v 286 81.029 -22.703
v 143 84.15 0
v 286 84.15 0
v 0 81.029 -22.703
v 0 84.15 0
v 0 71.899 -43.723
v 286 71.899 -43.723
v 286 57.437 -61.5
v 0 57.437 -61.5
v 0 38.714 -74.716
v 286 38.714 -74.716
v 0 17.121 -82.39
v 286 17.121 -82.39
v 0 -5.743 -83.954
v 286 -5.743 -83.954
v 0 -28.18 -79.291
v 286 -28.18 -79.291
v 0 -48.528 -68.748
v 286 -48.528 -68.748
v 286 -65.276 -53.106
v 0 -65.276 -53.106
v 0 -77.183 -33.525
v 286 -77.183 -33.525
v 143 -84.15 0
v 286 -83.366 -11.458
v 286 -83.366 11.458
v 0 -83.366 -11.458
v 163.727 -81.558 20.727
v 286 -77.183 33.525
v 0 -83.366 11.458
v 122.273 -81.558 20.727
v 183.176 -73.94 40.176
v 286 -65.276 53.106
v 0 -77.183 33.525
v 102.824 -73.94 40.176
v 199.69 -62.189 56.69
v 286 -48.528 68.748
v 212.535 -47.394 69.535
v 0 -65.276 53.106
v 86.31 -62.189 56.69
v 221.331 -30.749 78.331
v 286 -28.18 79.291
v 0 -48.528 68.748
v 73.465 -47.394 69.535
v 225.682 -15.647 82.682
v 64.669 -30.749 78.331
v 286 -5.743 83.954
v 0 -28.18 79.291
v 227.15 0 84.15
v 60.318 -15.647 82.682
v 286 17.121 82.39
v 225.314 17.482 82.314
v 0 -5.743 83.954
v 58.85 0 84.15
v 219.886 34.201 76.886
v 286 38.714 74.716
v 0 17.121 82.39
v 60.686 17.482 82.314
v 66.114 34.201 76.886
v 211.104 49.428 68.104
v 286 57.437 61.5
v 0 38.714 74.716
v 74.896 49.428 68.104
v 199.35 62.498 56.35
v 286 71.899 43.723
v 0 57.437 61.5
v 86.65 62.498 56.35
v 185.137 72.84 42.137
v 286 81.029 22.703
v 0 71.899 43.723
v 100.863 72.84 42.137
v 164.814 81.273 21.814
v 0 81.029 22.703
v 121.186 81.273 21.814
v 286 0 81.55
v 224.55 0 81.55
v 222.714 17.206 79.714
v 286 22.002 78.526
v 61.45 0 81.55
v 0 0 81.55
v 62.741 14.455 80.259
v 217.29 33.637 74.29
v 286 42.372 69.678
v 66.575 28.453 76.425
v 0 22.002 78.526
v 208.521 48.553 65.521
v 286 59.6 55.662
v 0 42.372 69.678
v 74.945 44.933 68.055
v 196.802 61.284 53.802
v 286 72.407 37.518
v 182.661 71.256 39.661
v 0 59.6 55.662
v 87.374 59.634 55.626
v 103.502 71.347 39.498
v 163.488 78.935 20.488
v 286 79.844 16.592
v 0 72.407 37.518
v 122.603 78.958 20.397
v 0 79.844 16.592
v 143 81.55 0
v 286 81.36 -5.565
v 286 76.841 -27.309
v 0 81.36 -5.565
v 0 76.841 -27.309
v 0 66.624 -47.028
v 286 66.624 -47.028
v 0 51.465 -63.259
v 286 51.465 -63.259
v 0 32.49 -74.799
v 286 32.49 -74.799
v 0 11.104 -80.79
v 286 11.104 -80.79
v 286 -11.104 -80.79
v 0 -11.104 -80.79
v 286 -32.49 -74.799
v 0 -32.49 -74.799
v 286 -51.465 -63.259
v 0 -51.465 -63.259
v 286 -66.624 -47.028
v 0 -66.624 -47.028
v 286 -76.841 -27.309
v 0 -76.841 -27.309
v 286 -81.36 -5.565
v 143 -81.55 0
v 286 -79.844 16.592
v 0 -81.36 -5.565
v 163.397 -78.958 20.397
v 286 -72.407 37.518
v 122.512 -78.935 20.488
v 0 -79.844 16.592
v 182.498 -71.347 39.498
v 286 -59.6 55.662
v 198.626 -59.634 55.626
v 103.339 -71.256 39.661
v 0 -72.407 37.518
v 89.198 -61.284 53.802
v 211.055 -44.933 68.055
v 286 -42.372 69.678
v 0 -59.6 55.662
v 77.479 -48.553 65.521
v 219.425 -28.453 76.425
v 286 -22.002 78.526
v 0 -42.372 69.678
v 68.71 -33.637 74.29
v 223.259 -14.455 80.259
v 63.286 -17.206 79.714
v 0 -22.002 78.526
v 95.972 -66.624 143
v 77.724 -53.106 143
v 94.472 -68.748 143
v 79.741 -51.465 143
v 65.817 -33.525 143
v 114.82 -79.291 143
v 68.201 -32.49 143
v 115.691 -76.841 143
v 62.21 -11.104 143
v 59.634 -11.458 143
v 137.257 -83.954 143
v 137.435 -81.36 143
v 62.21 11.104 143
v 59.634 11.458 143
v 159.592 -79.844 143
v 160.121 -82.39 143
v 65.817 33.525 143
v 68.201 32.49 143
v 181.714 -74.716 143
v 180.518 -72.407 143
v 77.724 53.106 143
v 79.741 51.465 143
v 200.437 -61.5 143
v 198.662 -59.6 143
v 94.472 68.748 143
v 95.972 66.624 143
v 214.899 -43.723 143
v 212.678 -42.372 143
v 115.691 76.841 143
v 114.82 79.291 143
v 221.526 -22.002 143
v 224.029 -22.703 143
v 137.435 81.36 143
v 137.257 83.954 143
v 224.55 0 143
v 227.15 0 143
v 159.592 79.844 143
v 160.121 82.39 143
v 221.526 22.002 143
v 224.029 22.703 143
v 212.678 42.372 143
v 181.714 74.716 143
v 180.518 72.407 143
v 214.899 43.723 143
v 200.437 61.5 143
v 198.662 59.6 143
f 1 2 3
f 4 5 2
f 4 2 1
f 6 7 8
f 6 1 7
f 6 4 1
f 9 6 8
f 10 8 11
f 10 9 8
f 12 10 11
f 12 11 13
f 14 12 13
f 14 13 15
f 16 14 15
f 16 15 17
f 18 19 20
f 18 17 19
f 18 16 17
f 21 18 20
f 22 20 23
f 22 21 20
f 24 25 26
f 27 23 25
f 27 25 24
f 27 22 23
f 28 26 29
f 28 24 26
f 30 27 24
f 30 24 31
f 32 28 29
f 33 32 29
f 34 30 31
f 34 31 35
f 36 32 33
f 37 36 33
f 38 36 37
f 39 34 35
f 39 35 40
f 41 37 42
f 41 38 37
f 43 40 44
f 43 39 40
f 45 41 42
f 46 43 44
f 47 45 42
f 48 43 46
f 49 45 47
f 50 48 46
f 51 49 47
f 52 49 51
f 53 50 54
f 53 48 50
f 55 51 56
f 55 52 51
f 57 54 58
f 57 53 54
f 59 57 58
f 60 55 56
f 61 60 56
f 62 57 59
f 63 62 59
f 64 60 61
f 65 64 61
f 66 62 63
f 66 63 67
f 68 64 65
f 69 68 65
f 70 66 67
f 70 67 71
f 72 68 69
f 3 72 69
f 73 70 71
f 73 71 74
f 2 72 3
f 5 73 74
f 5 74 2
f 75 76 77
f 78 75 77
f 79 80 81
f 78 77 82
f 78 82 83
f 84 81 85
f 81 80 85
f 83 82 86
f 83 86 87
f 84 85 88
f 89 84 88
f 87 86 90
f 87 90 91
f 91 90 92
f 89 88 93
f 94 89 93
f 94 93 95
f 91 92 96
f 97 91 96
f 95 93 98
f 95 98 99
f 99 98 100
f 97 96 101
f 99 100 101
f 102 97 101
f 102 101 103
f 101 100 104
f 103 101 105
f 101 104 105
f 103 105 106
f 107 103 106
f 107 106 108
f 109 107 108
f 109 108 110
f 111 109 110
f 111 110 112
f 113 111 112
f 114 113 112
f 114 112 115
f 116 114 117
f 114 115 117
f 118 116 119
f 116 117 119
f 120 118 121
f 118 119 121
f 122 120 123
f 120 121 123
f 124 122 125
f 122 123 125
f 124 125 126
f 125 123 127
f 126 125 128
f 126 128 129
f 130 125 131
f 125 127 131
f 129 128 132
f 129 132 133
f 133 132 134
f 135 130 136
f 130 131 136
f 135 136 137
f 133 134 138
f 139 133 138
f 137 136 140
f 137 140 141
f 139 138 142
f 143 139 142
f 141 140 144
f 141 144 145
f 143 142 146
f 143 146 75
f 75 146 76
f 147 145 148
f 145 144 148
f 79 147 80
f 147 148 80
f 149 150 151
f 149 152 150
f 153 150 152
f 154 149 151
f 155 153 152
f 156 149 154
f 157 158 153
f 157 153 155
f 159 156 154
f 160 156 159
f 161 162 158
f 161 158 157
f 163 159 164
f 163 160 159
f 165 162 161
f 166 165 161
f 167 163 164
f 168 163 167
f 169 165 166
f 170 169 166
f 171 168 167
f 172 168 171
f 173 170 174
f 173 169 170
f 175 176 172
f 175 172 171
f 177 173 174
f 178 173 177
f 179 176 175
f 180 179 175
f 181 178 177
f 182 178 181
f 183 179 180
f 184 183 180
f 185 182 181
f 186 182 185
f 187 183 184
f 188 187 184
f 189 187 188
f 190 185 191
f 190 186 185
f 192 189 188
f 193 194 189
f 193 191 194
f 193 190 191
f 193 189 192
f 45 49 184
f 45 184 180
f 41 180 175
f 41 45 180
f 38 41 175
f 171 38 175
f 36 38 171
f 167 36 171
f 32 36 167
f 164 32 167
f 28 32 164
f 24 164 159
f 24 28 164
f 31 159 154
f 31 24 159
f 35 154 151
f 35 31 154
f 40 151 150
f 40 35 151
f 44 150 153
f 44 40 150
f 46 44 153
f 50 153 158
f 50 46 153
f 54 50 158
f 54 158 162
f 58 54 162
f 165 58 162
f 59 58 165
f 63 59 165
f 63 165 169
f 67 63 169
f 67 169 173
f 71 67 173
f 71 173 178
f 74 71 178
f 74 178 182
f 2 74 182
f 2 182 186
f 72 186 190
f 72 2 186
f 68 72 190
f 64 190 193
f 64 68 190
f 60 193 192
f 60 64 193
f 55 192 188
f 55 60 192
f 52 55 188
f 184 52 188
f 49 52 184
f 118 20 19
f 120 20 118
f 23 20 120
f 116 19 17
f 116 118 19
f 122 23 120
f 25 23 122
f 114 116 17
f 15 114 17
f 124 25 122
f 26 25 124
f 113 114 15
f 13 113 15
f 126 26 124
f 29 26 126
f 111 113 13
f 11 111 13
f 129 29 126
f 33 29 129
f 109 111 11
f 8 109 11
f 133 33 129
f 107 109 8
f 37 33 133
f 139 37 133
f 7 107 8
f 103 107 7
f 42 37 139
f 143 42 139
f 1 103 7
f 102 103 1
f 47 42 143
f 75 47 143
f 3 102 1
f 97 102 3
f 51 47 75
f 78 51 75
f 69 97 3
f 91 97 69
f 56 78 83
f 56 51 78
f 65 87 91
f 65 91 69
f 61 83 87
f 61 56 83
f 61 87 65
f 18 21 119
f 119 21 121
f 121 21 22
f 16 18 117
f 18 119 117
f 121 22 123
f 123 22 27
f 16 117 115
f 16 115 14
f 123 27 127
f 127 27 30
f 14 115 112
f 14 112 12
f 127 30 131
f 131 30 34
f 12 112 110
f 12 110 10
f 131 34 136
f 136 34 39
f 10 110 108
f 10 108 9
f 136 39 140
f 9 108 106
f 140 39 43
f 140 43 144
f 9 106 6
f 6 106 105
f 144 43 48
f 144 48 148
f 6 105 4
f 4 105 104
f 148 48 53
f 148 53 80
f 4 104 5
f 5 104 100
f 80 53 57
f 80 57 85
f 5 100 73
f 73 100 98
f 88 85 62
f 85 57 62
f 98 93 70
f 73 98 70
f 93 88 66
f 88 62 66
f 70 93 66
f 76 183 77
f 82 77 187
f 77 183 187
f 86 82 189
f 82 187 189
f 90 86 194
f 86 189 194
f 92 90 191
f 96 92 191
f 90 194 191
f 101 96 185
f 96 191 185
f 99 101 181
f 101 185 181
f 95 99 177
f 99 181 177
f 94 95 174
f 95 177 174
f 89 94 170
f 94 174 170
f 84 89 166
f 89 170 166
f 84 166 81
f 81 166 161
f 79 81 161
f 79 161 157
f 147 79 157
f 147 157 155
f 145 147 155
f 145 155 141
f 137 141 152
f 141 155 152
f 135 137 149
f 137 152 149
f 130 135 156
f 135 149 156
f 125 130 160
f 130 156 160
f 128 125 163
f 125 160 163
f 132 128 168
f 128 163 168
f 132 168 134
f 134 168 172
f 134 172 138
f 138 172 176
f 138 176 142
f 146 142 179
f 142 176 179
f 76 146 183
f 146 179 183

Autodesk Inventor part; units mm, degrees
ref_plane "YZ Plane" through (0, 0, 0) normal (1, 0, 0) x (0, 1, 0)
ref_plane "XZ Plane" through (0, 0, 0) normal (0, 1, 0) x (-1, 0, 0)
ref_plane "XY Plane" through (0, 0, 0) normal (0, 0, 1) x (1, 0, 0)
sketch "Sketch1" plane through (0, 0, 0) normal (1, 0, 0) x (0, 1, 0)
  circle A0 centre (0, 0) radius 84.15
  dimension "d0" = 168.3
extrude "Extrude1" add sketch "Sketch1" along normal blind 286
sketch "Sketch2" plane through (0, 0, 0) normal (0, 0, 1) x (1, 0, 0)
  line L0 (0, 84.15) -> (0, -84.15) projected
  line L1 (286, 84.15) -> (286, -84.15) projected
  line L2 (0, 0) -> (286, 0) construction
  circle A0 centre (143, 0) radius 84.15
  dimension "d3" = 168.3
extrude "Extrude2" add sketch "Sketch2" along normal blind 143
sketch "Sketch3" plane through (0, 0, 0) normal (-1, 0, 0) x (0, 0, 1)
  circle A0 centre (0, 0) radius 84.15 projected
  circle A1 centre (0, 0) radius 81.55
  dimension "d6" = 163.1
extrude "Extrude3" cut sketch "Sketch3" against normal through all contours A1
sketch "Sketch4" plane through (143, 0, 143) normal (0, 0, 1) x (1, 0, 0)
  circle A0 centre (0, 0) radius 84.15 projected
  circle A1 centre (0, 0) radius 81.55
  dimension "d9" = 163.1
extrude "Extrude4" cut sketch "Sketch4" against normal up to next contours A1
equation "\"d0\" = d"
equation "\"d1\" = 2 * a"
equation "\"d3\" = d"
equation "\"d4\" = a"
equation "\"d6\" = d - 2 * s1"
equation "\"d7\" = a"
equation "\"d9\" = d - 2 * s1"
equation "\"d10\" = a"
equation "\"d\" = 168.3"
equation "\"s1\" = 2.6"
equation "\"a\" = 143"
equation "\"Size_Designation\" = 1.2345"
properties part number "DIN 2615-1 Tee 168.3 x 2.6 S" material "Steel"
